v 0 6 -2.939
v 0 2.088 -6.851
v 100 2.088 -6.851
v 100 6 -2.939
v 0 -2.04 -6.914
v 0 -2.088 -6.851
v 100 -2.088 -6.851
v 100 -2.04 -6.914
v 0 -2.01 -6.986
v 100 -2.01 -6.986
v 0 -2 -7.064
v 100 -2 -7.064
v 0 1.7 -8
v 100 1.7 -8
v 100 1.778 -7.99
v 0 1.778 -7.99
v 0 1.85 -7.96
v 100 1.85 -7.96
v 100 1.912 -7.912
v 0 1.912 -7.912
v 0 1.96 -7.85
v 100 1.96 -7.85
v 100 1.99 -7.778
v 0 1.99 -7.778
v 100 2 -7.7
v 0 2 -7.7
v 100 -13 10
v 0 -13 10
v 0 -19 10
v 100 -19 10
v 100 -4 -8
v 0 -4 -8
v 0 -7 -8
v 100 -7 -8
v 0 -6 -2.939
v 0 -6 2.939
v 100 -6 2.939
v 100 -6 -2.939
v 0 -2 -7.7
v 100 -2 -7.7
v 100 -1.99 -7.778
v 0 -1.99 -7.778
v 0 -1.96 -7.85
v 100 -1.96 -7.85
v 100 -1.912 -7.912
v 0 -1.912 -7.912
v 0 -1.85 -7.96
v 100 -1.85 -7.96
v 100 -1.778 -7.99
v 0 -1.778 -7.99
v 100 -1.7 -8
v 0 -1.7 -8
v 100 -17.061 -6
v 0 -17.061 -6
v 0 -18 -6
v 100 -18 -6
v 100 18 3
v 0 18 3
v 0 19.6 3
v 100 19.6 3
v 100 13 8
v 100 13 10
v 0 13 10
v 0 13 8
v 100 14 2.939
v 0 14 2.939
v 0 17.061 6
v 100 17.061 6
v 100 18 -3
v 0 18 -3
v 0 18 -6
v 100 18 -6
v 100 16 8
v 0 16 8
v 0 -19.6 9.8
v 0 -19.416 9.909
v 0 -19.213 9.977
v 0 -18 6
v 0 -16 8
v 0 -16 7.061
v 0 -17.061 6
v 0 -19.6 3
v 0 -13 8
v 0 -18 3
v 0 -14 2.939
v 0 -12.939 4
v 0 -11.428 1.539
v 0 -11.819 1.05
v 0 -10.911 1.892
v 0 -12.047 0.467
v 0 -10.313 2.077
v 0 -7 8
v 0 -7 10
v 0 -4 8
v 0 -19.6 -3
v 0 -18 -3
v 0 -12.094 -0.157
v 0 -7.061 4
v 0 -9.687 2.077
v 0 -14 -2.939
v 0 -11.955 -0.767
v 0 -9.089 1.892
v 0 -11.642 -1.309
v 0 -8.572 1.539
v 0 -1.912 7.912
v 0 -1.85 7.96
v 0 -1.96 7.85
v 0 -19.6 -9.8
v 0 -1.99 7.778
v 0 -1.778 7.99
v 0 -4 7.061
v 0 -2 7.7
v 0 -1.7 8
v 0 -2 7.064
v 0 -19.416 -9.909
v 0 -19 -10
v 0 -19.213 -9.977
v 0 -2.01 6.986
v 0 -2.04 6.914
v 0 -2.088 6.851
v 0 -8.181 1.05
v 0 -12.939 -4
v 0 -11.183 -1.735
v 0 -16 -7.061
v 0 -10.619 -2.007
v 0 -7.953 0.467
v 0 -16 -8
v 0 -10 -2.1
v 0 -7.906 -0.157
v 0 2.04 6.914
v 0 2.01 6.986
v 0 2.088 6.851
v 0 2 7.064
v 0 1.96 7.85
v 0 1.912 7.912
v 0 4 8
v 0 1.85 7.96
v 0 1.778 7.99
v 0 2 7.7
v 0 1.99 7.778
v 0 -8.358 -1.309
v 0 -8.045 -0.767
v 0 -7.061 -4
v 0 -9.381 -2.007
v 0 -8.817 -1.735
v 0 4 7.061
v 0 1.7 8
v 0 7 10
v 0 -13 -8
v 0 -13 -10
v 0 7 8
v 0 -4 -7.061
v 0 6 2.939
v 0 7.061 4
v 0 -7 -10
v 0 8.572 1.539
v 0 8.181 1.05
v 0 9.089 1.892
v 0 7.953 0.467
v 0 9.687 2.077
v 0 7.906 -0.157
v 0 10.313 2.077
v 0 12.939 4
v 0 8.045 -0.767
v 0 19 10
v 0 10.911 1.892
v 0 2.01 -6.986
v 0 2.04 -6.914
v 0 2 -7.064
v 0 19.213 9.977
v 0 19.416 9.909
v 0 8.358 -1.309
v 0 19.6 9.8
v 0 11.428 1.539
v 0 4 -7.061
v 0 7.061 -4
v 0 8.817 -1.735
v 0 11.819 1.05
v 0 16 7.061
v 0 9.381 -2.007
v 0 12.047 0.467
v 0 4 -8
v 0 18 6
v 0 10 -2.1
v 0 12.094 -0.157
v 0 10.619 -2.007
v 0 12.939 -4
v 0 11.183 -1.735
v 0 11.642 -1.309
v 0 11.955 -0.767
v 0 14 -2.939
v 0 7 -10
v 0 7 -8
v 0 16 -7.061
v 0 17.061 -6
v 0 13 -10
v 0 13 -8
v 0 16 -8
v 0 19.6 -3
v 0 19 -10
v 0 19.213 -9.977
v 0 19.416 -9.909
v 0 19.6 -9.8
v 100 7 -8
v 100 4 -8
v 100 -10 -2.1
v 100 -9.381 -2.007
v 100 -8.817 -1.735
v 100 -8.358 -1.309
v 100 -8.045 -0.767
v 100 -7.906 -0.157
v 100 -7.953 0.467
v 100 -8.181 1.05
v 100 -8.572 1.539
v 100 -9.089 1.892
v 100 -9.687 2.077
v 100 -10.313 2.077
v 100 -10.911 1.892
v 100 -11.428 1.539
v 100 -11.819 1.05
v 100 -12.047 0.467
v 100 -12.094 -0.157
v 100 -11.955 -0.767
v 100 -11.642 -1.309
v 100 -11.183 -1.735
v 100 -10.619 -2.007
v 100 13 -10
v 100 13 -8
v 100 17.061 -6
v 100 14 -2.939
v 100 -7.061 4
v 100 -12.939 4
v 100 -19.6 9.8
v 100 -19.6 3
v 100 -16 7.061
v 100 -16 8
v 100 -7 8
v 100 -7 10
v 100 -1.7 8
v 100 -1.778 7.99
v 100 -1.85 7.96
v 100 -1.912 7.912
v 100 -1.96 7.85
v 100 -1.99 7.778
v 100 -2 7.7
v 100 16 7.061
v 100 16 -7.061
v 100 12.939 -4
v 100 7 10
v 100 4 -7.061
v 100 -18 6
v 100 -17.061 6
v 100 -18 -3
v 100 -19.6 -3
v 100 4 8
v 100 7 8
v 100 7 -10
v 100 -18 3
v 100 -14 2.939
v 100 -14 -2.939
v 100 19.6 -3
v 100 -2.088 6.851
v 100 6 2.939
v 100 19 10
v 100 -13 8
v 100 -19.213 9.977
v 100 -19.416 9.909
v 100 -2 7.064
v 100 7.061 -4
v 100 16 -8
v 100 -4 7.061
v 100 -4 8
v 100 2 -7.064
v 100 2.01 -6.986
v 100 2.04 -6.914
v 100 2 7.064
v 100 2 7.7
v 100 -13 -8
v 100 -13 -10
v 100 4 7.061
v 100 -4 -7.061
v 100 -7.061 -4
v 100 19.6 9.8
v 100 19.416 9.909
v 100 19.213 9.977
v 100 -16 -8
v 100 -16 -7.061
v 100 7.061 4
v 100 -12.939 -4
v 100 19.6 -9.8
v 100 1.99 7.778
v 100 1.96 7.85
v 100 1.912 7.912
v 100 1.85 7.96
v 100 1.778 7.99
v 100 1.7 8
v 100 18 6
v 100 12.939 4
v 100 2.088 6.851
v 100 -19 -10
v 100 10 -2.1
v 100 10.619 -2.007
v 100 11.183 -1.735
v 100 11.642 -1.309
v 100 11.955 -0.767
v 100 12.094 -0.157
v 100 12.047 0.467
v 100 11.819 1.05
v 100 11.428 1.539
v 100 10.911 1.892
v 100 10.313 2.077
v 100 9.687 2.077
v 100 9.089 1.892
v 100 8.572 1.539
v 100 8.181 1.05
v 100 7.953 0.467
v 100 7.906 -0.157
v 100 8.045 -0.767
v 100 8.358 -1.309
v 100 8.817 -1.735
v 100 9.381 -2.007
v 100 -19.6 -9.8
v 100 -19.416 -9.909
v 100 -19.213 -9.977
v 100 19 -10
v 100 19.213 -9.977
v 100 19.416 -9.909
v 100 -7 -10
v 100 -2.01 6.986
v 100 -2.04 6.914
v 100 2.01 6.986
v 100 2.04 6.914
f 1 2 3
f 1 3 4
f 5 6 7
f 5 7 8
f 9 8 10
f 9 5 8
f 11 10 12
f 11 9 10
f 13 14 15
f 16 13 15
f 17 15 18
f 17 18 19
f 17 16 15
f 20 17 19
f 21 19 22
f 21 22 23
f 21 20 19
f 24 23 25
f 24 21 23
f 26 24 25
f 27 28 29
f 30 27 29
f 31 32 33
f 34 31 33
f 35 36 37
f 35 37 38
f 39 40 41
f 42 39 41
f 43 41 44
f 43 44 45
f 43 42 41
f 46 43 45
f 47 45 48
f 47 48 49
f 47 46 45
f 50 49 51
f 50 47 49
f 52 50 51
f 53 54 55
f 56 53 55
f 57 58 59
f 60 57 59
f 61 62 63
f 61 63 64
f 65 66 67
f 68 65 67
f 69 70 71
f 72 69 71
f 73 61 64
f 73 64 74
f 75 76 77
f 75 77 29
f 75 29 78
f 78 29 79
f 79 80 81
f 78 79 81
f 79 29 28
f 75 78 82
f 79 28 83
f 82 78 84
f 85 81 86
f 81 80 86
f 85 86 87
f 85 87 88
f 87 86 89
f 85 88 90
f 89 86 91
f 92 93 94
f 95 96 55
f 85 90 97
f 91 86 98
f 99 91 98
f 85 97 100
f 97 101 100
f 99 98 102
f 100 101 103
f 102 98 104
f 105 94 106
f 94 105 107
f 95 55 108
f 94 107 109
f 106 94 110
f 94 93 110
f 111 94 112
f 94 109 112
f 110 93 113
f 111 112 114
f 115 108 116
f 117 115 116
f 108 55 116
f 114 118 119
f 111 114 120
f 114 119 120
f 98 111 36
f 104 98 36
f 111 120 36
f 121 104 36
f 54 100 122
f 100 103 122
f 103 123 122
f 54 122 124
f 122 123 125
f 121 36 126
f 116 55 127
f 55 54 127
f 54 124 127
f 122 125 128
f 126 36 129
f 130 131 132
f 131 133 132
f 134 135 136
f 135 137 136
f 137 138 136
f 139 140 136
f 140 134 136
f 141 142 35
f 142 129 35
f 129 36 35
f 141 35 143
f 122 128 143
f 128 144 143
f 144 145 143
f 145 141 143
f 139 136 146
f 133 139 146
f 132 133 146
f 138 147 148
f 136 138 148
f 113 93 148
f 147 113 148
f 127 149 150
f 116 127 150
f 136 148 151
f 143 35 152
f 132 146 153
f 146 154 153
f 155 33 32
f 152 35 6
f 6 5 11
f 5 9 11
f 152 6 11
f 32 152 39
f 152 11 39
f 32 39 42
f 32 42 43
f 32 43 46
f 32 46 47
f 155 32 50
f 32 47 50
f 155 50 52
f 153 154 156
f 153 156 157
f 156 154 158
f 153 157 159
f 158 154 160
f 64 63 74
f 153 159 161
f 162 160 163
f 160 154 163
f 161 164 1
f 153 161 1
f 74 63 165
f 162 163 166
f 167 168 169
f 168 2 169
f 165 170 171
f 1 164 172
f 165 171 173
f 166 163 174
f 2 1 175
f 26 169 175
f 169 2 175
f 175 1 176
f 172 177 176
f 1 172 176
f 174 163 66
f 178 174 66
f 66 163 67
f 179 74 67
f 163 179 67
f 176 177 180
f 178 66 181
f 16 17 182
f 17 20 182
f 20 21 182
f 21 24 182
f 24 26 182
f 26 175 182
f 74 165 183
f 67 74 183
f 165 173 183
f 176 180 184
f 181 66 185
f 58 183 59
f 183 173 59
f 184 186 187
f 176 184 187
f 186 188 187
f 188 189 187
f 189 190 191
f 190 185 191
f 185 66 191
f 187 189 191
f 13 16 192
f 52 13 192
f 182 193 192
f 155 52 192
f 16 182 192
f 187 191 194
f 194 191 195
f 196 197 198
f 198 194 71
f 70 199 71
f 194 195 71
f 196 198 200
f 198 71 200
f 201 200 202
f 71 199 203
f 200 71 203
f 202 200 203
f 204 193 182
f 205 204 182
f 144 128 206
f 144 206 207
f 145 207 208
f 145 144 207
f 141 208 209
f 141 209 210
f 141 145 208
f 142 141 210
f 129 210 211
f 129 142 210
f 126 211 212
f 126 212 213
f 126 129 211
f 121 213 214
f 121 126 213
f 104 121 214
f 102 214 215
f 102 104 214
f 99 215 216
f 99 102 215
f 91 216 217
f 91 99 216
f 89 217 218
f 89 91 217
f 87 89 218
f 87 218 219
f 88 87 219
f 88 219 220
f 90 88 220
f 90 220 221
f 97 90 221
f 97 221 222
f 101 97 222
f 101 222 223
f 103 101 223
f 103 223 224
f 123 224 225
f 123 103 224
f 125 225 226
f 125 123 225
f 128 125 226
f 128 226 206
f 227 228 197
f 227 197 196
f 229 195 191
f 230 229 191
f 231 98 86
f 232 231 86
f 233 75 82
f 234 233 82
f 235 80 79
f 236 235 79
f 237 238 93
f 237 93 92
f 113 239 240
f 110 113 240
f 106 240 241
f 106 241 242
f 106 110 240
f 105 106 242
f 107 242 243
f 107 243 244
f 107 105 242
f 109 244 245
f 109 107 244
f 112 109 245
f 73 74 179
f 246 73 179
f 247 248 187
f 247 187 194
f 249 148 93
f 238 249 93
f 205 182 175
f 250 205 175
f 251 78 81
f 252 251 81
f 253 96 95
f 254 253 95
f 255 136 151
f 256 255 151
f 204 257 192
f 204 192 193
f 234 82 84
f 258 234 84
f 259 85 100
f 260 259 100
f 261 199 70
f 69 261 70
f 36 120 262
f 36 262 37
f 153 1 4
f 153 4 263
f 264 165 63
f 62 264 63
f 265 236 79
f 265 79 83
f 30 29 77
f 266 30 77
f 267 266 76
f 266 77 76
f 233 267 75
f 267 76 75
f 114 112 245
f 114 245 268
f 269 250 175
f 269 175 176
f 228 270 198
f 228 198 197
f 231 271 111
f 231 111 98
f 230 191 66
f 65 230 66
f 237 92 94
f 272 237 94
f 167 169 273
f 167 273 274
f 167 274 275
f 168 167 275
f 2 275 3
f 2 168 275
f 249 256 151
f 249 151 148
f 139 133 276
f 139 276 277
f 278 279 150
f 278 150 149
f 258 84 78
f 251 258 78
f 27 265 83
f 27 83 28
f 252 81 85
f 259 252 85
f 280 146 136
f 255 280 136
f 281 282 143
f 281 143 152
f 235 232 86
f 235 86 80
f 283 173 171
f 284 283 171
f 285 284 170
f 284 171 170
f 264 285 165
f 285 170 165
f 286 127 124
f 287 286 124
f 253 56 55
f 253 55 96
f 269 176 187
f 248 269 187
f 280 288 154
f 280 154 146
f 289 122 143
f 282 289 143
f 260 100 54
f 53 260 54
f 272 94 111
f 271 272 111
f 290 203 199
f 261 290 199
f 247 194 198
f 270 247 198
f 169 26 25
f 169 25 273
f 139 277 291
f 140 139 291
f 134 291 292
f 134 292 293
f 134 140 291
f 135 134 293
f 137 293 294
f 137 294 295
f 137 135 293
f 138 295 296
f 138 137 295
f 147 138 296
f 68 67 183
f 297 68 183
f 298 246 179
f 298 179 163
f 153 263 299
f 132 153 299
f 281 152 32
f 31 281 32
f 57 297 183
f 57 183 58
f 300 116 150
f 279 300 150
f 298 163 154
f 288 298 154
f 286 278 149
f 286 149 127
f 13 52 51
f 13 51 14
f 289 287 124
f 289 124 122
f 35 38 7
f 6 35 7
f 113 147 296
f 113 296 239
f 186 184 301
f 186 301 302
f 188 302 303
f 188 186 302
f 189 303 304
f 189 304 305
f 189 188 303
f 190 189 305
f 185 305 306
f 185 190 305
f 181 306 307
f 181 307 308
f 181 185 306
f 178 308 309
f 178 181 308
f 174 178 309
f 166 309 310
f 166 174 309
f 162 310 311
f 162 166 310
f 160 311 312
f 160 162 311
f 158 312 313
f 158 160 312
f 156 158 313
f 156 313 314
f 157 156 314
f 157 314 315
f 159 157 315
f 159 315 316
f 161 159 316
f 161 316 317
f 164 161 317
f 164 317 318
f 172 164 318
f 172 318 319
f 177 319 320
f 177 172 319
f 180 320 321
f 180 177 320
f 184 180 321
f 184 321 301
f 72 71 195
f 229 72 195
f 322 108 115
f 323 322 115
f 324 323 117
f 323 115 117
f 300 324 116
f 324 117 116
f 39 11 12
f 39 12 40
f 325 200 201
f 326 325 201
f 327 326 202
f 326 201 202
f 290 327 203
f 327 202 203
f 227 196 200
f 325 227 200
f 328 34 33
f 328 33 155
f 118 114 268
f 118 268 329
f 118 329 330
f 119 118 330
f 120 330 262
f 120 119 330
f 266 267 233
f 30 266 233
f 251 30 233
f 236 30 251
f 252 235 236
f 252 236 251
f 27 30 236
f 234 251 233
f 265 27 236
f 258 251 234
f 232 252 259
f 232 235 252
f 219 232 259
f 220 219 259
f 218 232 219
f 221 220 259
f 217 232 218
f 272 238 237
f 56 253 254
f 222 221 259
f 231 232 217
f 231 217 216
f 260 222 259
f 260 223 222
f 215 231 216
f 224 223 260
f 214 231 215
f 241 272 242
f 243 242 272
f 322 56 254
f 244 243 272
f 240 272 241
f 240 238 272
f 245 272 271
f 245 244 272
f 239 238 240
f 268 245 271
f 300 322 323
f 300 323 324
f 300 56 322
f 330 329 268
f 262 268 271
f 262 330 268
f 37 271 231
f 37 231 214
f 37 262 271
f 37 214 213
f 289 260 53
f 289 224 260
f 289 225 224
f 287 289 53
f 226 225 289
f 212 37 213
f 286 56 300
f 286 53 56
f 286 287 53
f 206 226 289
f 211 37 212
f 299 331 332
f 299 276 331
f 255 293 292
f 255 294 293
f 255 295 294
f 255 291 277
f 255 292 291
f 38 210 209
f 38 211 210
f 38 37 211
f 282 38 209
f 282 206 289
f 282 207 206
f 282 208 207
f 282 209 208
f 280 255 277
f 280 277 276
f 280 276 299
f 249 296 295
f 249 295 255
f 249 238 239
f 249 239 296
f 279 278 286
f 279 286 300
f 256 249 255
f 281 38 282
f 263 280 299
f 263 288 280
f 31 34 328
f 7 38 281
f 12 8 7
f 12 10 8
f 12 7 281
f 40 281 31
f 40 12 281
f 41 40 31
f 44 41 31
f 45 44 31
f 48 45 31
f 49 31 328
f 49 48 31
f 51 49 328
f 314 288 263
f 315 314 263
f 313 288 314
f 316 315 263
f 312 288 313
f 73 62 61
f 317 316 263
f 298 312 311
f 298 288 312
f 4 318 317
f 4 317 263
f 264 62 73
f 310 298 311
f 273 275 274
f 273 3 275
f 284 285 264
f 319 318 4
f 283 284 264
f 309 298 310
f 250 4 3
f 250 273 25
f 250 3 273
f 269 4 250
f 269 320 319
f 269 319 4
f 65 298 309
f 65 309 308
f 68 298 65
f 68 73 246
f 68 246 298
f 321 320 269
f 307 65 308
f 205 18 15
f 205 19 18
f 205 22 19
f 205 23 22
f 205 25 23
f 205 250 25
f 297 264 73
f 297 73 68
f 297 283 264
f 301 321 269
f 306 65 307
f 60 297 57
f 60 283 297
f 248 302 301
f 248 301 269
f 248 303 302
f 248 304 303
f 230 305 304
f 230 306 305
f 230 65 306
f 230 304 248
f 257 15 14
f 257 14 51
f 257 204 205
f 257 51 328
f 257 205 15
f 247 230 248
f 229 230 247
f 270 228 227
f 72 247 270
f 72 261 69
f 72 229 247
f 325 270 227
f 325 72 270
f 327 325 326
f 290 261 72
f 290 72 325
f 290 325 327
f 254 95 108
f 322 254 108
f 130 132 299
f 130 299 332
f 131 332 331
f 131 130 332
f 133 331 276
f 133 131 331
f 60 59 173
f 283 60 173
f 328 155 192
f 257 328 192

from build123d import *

# Parameters (mm, degrees)
SKETCH1_R           = 2.1
BOSS_EXTRUDE1_DEPTH = 100


with BuildPart() as part:
    # Sketch1 → Boss-Extrude1 (new body)
    with BuildSketch(Plane(origin=(0, 0, 0), x_dir=(0, 0, -1), z_dir=(1, 0, 0))):
        with BuildLine():
            Line((-10, 7), (-10, -7))
            Line((-10, -7), (-8, -7))
            Line((-8, -7), (-8, -4))
            Line((-8, -4), (-7.060660172, -4))
            Line((-7.060660172, -4), (-4, -7.060660172))
            Line((-4, -7.060660172), (-4, -12.939339828))
            Line((-4, -12.939339828), (-7.060660172, -16))
            Line((-7.060660172, -16), (-8, -16))
            Line((-8, -16), (-8, -13))
            Line((-8, -13), (-10, -13))
            Line((-10, -13), (-10, -19))
            ThreePointArc((-10, -19), (-9.948683298, -19.316227766), (-9.8, -19.6))
            Line((-9.8, -19.6), (-3, -19.6))
            Line((-3, -19.6), (-3, -18))
            Line((-3, -18), (-6, -18))
            Line((-6, -18), (-6, -17.060660172))
            Line((-6, -17.060660172), (-2.939339828, -14))
            Line((-2.939339828, -14), (2.939339828, -14))
            Line((2.939339828, -14), (6, -17.060660172))
            Line((6, -17.060660172), (6, -18))
            Line((6, -18), (3, -18))
            Line((3, -18), (3, -19.6))
            Line((3, -19.6), (9.8, -19.6))
            ThreePointArc((9.8, -19.6), (9.948683298, -19.316227766), (10, -19))
            Line((10, -19), (10, -13))
            Line((10, -13), (8, -13))
            Line((8, -13), (8, -16))
            Line((8, -16), (7.060660172, -16))
            Line((7.060660172, -16), (4, -12.939339828))
            Line((4, -12.939339828), (4, -7.060660172))
            Line((4, -7.060660172), (7.060660172, -4))
            Line((7.060660172, -4), (8, -4))
            Line((8, -4), (8, -7))
            Line((8, -7), (10, -7))
            Line((10, -7), (10, 7))
            Line((10, 7), (8, 7))
            Line((8, 7), (8, 4))
            Line((8, 4), (7.060660172, 4))
            Line((7.060660172, 4), (4, 7.060660172))
            Line((4, 7.060660172), (4, 12.939339828))
            Line((4, 12.939339828), (7.060660172, 16))
            Line((7.060660172, 16), (8, 16))
            Line((8, 16), (8, 13))
            Line((8, 13), (10, 13))
            Line((10, 13), (10, 19))
            ThreePointArc((10, 19), (9.948683298, 19.316227766), (9.8, 19.6))
            Line((9.8, 19.6), (3, 19.6))
            Line((3, 19.6), (3, 18))
            Line((3, 18), (6, 18))
            Line((6, 18), (6, 17.060660172))
            Line((6, 17.060660172), (2.939339828, 14))
            Line((2.939339828, 14), (-2.939339828, 14))
            Line((-2.939339828, 14), (-6, 17.060660172))
            Line((-6, 17.060660172), (-6, 18))
            Line((-6, 18), (-3, 18))
            Line((-3, 18), (-3, 19.6))
            Line((-3, 19.6), (-9.8, 19.6))
            ThreePointArc((-9.8, 19.6), (-9.948683298, 19.316227766), (-10, 19))
            Line((-10, 19), (-10, 13))
            Line((-10, 13), (-8, 13))
            Line((-8, 13), (-8, 16))
            Line((-8, 16), (-7.060660172, 16))
            Line((-7.060660172, 16), (-4, 12.939339828))
            Line((-4, 12.939339828), (-4, 7.060660172))
            Line((-4, 7.060660172), (-7.060660172, 4))
            Line((-7.060660172, 4), (-8, 4))
            Line((-8, 4), (-8, 7))
            Line((-8, 7), (-10, 7))
        make_face()
        with Locations((0, 10)):
            Circle(SKETCH1_R, mode=Mode.SUBTRACT)
        with Locations((0, -10)):
            Circle(SKETCH1_R, mode=Mode.SUBTRACT)
        with BuildLine():
            Line((-8, 1.7), (-8, -1.7))
            ThreePointArc((-8, -1.7), (-7.912132034, -1.912132034), (-7.7, -2))
            Line((-7.7, -2), (-7.063603897, -2))
            ThreePointArc((-7.063603897, -2), (-6.948798867, -2.02283614), (-6.851471863, -2.087867966))
            Line((-6.851471863, -2.087867966), (-2.939339828, -6))
            Line((-2.939339828, -6), (2.939339828, -6))
            Line((2.939339828, -6), (6.851471863, -2.087867966))
            ThreePointArc((6.851471863, -2.087867966), (6.948798867, -2.02283614), (7.063603897, -2))
            Line((7.063603897, -2), (7.7, -2))
            ThreePointArc((7.7, -2), (7.912132034, -1.912132034), (8, -1.7))
            Line((8, -1.7), (8, 1.7))
            ThreePointArc((8, 1.7), (7.912132034, 1.912132034), (7.7, 2))
            Line((7.7, 2), (7.063603897, 2))
            ThreePointArc((7.063603897, 2), (6.948798867, 2.02283614), (6.851471863, 2.087867966))
            Line((6.851471863, 2.087867966), (2.939339828, 6))
            Line((2.939339828, 6), (-2.939339828, 6))
            Line((-2.939339828, 6), (-6.851471863, 2.087867966))
            ThreePointArc((-6.851471863, 2.087867966), (-6.948798867, 2.02283614), (-7.063603897, 2))
            Line((-7.063603897, 2), (-7.7, 2))
            ThreePointArc((-7.7, 2), (-7.912132034, 1.912132034), (-8, 1.7))
        make_face(mode=Mode.SUBTRACT)
    extrude(amount=BOSS_EXTRUDE1_DEPTH)


solid = part.part
